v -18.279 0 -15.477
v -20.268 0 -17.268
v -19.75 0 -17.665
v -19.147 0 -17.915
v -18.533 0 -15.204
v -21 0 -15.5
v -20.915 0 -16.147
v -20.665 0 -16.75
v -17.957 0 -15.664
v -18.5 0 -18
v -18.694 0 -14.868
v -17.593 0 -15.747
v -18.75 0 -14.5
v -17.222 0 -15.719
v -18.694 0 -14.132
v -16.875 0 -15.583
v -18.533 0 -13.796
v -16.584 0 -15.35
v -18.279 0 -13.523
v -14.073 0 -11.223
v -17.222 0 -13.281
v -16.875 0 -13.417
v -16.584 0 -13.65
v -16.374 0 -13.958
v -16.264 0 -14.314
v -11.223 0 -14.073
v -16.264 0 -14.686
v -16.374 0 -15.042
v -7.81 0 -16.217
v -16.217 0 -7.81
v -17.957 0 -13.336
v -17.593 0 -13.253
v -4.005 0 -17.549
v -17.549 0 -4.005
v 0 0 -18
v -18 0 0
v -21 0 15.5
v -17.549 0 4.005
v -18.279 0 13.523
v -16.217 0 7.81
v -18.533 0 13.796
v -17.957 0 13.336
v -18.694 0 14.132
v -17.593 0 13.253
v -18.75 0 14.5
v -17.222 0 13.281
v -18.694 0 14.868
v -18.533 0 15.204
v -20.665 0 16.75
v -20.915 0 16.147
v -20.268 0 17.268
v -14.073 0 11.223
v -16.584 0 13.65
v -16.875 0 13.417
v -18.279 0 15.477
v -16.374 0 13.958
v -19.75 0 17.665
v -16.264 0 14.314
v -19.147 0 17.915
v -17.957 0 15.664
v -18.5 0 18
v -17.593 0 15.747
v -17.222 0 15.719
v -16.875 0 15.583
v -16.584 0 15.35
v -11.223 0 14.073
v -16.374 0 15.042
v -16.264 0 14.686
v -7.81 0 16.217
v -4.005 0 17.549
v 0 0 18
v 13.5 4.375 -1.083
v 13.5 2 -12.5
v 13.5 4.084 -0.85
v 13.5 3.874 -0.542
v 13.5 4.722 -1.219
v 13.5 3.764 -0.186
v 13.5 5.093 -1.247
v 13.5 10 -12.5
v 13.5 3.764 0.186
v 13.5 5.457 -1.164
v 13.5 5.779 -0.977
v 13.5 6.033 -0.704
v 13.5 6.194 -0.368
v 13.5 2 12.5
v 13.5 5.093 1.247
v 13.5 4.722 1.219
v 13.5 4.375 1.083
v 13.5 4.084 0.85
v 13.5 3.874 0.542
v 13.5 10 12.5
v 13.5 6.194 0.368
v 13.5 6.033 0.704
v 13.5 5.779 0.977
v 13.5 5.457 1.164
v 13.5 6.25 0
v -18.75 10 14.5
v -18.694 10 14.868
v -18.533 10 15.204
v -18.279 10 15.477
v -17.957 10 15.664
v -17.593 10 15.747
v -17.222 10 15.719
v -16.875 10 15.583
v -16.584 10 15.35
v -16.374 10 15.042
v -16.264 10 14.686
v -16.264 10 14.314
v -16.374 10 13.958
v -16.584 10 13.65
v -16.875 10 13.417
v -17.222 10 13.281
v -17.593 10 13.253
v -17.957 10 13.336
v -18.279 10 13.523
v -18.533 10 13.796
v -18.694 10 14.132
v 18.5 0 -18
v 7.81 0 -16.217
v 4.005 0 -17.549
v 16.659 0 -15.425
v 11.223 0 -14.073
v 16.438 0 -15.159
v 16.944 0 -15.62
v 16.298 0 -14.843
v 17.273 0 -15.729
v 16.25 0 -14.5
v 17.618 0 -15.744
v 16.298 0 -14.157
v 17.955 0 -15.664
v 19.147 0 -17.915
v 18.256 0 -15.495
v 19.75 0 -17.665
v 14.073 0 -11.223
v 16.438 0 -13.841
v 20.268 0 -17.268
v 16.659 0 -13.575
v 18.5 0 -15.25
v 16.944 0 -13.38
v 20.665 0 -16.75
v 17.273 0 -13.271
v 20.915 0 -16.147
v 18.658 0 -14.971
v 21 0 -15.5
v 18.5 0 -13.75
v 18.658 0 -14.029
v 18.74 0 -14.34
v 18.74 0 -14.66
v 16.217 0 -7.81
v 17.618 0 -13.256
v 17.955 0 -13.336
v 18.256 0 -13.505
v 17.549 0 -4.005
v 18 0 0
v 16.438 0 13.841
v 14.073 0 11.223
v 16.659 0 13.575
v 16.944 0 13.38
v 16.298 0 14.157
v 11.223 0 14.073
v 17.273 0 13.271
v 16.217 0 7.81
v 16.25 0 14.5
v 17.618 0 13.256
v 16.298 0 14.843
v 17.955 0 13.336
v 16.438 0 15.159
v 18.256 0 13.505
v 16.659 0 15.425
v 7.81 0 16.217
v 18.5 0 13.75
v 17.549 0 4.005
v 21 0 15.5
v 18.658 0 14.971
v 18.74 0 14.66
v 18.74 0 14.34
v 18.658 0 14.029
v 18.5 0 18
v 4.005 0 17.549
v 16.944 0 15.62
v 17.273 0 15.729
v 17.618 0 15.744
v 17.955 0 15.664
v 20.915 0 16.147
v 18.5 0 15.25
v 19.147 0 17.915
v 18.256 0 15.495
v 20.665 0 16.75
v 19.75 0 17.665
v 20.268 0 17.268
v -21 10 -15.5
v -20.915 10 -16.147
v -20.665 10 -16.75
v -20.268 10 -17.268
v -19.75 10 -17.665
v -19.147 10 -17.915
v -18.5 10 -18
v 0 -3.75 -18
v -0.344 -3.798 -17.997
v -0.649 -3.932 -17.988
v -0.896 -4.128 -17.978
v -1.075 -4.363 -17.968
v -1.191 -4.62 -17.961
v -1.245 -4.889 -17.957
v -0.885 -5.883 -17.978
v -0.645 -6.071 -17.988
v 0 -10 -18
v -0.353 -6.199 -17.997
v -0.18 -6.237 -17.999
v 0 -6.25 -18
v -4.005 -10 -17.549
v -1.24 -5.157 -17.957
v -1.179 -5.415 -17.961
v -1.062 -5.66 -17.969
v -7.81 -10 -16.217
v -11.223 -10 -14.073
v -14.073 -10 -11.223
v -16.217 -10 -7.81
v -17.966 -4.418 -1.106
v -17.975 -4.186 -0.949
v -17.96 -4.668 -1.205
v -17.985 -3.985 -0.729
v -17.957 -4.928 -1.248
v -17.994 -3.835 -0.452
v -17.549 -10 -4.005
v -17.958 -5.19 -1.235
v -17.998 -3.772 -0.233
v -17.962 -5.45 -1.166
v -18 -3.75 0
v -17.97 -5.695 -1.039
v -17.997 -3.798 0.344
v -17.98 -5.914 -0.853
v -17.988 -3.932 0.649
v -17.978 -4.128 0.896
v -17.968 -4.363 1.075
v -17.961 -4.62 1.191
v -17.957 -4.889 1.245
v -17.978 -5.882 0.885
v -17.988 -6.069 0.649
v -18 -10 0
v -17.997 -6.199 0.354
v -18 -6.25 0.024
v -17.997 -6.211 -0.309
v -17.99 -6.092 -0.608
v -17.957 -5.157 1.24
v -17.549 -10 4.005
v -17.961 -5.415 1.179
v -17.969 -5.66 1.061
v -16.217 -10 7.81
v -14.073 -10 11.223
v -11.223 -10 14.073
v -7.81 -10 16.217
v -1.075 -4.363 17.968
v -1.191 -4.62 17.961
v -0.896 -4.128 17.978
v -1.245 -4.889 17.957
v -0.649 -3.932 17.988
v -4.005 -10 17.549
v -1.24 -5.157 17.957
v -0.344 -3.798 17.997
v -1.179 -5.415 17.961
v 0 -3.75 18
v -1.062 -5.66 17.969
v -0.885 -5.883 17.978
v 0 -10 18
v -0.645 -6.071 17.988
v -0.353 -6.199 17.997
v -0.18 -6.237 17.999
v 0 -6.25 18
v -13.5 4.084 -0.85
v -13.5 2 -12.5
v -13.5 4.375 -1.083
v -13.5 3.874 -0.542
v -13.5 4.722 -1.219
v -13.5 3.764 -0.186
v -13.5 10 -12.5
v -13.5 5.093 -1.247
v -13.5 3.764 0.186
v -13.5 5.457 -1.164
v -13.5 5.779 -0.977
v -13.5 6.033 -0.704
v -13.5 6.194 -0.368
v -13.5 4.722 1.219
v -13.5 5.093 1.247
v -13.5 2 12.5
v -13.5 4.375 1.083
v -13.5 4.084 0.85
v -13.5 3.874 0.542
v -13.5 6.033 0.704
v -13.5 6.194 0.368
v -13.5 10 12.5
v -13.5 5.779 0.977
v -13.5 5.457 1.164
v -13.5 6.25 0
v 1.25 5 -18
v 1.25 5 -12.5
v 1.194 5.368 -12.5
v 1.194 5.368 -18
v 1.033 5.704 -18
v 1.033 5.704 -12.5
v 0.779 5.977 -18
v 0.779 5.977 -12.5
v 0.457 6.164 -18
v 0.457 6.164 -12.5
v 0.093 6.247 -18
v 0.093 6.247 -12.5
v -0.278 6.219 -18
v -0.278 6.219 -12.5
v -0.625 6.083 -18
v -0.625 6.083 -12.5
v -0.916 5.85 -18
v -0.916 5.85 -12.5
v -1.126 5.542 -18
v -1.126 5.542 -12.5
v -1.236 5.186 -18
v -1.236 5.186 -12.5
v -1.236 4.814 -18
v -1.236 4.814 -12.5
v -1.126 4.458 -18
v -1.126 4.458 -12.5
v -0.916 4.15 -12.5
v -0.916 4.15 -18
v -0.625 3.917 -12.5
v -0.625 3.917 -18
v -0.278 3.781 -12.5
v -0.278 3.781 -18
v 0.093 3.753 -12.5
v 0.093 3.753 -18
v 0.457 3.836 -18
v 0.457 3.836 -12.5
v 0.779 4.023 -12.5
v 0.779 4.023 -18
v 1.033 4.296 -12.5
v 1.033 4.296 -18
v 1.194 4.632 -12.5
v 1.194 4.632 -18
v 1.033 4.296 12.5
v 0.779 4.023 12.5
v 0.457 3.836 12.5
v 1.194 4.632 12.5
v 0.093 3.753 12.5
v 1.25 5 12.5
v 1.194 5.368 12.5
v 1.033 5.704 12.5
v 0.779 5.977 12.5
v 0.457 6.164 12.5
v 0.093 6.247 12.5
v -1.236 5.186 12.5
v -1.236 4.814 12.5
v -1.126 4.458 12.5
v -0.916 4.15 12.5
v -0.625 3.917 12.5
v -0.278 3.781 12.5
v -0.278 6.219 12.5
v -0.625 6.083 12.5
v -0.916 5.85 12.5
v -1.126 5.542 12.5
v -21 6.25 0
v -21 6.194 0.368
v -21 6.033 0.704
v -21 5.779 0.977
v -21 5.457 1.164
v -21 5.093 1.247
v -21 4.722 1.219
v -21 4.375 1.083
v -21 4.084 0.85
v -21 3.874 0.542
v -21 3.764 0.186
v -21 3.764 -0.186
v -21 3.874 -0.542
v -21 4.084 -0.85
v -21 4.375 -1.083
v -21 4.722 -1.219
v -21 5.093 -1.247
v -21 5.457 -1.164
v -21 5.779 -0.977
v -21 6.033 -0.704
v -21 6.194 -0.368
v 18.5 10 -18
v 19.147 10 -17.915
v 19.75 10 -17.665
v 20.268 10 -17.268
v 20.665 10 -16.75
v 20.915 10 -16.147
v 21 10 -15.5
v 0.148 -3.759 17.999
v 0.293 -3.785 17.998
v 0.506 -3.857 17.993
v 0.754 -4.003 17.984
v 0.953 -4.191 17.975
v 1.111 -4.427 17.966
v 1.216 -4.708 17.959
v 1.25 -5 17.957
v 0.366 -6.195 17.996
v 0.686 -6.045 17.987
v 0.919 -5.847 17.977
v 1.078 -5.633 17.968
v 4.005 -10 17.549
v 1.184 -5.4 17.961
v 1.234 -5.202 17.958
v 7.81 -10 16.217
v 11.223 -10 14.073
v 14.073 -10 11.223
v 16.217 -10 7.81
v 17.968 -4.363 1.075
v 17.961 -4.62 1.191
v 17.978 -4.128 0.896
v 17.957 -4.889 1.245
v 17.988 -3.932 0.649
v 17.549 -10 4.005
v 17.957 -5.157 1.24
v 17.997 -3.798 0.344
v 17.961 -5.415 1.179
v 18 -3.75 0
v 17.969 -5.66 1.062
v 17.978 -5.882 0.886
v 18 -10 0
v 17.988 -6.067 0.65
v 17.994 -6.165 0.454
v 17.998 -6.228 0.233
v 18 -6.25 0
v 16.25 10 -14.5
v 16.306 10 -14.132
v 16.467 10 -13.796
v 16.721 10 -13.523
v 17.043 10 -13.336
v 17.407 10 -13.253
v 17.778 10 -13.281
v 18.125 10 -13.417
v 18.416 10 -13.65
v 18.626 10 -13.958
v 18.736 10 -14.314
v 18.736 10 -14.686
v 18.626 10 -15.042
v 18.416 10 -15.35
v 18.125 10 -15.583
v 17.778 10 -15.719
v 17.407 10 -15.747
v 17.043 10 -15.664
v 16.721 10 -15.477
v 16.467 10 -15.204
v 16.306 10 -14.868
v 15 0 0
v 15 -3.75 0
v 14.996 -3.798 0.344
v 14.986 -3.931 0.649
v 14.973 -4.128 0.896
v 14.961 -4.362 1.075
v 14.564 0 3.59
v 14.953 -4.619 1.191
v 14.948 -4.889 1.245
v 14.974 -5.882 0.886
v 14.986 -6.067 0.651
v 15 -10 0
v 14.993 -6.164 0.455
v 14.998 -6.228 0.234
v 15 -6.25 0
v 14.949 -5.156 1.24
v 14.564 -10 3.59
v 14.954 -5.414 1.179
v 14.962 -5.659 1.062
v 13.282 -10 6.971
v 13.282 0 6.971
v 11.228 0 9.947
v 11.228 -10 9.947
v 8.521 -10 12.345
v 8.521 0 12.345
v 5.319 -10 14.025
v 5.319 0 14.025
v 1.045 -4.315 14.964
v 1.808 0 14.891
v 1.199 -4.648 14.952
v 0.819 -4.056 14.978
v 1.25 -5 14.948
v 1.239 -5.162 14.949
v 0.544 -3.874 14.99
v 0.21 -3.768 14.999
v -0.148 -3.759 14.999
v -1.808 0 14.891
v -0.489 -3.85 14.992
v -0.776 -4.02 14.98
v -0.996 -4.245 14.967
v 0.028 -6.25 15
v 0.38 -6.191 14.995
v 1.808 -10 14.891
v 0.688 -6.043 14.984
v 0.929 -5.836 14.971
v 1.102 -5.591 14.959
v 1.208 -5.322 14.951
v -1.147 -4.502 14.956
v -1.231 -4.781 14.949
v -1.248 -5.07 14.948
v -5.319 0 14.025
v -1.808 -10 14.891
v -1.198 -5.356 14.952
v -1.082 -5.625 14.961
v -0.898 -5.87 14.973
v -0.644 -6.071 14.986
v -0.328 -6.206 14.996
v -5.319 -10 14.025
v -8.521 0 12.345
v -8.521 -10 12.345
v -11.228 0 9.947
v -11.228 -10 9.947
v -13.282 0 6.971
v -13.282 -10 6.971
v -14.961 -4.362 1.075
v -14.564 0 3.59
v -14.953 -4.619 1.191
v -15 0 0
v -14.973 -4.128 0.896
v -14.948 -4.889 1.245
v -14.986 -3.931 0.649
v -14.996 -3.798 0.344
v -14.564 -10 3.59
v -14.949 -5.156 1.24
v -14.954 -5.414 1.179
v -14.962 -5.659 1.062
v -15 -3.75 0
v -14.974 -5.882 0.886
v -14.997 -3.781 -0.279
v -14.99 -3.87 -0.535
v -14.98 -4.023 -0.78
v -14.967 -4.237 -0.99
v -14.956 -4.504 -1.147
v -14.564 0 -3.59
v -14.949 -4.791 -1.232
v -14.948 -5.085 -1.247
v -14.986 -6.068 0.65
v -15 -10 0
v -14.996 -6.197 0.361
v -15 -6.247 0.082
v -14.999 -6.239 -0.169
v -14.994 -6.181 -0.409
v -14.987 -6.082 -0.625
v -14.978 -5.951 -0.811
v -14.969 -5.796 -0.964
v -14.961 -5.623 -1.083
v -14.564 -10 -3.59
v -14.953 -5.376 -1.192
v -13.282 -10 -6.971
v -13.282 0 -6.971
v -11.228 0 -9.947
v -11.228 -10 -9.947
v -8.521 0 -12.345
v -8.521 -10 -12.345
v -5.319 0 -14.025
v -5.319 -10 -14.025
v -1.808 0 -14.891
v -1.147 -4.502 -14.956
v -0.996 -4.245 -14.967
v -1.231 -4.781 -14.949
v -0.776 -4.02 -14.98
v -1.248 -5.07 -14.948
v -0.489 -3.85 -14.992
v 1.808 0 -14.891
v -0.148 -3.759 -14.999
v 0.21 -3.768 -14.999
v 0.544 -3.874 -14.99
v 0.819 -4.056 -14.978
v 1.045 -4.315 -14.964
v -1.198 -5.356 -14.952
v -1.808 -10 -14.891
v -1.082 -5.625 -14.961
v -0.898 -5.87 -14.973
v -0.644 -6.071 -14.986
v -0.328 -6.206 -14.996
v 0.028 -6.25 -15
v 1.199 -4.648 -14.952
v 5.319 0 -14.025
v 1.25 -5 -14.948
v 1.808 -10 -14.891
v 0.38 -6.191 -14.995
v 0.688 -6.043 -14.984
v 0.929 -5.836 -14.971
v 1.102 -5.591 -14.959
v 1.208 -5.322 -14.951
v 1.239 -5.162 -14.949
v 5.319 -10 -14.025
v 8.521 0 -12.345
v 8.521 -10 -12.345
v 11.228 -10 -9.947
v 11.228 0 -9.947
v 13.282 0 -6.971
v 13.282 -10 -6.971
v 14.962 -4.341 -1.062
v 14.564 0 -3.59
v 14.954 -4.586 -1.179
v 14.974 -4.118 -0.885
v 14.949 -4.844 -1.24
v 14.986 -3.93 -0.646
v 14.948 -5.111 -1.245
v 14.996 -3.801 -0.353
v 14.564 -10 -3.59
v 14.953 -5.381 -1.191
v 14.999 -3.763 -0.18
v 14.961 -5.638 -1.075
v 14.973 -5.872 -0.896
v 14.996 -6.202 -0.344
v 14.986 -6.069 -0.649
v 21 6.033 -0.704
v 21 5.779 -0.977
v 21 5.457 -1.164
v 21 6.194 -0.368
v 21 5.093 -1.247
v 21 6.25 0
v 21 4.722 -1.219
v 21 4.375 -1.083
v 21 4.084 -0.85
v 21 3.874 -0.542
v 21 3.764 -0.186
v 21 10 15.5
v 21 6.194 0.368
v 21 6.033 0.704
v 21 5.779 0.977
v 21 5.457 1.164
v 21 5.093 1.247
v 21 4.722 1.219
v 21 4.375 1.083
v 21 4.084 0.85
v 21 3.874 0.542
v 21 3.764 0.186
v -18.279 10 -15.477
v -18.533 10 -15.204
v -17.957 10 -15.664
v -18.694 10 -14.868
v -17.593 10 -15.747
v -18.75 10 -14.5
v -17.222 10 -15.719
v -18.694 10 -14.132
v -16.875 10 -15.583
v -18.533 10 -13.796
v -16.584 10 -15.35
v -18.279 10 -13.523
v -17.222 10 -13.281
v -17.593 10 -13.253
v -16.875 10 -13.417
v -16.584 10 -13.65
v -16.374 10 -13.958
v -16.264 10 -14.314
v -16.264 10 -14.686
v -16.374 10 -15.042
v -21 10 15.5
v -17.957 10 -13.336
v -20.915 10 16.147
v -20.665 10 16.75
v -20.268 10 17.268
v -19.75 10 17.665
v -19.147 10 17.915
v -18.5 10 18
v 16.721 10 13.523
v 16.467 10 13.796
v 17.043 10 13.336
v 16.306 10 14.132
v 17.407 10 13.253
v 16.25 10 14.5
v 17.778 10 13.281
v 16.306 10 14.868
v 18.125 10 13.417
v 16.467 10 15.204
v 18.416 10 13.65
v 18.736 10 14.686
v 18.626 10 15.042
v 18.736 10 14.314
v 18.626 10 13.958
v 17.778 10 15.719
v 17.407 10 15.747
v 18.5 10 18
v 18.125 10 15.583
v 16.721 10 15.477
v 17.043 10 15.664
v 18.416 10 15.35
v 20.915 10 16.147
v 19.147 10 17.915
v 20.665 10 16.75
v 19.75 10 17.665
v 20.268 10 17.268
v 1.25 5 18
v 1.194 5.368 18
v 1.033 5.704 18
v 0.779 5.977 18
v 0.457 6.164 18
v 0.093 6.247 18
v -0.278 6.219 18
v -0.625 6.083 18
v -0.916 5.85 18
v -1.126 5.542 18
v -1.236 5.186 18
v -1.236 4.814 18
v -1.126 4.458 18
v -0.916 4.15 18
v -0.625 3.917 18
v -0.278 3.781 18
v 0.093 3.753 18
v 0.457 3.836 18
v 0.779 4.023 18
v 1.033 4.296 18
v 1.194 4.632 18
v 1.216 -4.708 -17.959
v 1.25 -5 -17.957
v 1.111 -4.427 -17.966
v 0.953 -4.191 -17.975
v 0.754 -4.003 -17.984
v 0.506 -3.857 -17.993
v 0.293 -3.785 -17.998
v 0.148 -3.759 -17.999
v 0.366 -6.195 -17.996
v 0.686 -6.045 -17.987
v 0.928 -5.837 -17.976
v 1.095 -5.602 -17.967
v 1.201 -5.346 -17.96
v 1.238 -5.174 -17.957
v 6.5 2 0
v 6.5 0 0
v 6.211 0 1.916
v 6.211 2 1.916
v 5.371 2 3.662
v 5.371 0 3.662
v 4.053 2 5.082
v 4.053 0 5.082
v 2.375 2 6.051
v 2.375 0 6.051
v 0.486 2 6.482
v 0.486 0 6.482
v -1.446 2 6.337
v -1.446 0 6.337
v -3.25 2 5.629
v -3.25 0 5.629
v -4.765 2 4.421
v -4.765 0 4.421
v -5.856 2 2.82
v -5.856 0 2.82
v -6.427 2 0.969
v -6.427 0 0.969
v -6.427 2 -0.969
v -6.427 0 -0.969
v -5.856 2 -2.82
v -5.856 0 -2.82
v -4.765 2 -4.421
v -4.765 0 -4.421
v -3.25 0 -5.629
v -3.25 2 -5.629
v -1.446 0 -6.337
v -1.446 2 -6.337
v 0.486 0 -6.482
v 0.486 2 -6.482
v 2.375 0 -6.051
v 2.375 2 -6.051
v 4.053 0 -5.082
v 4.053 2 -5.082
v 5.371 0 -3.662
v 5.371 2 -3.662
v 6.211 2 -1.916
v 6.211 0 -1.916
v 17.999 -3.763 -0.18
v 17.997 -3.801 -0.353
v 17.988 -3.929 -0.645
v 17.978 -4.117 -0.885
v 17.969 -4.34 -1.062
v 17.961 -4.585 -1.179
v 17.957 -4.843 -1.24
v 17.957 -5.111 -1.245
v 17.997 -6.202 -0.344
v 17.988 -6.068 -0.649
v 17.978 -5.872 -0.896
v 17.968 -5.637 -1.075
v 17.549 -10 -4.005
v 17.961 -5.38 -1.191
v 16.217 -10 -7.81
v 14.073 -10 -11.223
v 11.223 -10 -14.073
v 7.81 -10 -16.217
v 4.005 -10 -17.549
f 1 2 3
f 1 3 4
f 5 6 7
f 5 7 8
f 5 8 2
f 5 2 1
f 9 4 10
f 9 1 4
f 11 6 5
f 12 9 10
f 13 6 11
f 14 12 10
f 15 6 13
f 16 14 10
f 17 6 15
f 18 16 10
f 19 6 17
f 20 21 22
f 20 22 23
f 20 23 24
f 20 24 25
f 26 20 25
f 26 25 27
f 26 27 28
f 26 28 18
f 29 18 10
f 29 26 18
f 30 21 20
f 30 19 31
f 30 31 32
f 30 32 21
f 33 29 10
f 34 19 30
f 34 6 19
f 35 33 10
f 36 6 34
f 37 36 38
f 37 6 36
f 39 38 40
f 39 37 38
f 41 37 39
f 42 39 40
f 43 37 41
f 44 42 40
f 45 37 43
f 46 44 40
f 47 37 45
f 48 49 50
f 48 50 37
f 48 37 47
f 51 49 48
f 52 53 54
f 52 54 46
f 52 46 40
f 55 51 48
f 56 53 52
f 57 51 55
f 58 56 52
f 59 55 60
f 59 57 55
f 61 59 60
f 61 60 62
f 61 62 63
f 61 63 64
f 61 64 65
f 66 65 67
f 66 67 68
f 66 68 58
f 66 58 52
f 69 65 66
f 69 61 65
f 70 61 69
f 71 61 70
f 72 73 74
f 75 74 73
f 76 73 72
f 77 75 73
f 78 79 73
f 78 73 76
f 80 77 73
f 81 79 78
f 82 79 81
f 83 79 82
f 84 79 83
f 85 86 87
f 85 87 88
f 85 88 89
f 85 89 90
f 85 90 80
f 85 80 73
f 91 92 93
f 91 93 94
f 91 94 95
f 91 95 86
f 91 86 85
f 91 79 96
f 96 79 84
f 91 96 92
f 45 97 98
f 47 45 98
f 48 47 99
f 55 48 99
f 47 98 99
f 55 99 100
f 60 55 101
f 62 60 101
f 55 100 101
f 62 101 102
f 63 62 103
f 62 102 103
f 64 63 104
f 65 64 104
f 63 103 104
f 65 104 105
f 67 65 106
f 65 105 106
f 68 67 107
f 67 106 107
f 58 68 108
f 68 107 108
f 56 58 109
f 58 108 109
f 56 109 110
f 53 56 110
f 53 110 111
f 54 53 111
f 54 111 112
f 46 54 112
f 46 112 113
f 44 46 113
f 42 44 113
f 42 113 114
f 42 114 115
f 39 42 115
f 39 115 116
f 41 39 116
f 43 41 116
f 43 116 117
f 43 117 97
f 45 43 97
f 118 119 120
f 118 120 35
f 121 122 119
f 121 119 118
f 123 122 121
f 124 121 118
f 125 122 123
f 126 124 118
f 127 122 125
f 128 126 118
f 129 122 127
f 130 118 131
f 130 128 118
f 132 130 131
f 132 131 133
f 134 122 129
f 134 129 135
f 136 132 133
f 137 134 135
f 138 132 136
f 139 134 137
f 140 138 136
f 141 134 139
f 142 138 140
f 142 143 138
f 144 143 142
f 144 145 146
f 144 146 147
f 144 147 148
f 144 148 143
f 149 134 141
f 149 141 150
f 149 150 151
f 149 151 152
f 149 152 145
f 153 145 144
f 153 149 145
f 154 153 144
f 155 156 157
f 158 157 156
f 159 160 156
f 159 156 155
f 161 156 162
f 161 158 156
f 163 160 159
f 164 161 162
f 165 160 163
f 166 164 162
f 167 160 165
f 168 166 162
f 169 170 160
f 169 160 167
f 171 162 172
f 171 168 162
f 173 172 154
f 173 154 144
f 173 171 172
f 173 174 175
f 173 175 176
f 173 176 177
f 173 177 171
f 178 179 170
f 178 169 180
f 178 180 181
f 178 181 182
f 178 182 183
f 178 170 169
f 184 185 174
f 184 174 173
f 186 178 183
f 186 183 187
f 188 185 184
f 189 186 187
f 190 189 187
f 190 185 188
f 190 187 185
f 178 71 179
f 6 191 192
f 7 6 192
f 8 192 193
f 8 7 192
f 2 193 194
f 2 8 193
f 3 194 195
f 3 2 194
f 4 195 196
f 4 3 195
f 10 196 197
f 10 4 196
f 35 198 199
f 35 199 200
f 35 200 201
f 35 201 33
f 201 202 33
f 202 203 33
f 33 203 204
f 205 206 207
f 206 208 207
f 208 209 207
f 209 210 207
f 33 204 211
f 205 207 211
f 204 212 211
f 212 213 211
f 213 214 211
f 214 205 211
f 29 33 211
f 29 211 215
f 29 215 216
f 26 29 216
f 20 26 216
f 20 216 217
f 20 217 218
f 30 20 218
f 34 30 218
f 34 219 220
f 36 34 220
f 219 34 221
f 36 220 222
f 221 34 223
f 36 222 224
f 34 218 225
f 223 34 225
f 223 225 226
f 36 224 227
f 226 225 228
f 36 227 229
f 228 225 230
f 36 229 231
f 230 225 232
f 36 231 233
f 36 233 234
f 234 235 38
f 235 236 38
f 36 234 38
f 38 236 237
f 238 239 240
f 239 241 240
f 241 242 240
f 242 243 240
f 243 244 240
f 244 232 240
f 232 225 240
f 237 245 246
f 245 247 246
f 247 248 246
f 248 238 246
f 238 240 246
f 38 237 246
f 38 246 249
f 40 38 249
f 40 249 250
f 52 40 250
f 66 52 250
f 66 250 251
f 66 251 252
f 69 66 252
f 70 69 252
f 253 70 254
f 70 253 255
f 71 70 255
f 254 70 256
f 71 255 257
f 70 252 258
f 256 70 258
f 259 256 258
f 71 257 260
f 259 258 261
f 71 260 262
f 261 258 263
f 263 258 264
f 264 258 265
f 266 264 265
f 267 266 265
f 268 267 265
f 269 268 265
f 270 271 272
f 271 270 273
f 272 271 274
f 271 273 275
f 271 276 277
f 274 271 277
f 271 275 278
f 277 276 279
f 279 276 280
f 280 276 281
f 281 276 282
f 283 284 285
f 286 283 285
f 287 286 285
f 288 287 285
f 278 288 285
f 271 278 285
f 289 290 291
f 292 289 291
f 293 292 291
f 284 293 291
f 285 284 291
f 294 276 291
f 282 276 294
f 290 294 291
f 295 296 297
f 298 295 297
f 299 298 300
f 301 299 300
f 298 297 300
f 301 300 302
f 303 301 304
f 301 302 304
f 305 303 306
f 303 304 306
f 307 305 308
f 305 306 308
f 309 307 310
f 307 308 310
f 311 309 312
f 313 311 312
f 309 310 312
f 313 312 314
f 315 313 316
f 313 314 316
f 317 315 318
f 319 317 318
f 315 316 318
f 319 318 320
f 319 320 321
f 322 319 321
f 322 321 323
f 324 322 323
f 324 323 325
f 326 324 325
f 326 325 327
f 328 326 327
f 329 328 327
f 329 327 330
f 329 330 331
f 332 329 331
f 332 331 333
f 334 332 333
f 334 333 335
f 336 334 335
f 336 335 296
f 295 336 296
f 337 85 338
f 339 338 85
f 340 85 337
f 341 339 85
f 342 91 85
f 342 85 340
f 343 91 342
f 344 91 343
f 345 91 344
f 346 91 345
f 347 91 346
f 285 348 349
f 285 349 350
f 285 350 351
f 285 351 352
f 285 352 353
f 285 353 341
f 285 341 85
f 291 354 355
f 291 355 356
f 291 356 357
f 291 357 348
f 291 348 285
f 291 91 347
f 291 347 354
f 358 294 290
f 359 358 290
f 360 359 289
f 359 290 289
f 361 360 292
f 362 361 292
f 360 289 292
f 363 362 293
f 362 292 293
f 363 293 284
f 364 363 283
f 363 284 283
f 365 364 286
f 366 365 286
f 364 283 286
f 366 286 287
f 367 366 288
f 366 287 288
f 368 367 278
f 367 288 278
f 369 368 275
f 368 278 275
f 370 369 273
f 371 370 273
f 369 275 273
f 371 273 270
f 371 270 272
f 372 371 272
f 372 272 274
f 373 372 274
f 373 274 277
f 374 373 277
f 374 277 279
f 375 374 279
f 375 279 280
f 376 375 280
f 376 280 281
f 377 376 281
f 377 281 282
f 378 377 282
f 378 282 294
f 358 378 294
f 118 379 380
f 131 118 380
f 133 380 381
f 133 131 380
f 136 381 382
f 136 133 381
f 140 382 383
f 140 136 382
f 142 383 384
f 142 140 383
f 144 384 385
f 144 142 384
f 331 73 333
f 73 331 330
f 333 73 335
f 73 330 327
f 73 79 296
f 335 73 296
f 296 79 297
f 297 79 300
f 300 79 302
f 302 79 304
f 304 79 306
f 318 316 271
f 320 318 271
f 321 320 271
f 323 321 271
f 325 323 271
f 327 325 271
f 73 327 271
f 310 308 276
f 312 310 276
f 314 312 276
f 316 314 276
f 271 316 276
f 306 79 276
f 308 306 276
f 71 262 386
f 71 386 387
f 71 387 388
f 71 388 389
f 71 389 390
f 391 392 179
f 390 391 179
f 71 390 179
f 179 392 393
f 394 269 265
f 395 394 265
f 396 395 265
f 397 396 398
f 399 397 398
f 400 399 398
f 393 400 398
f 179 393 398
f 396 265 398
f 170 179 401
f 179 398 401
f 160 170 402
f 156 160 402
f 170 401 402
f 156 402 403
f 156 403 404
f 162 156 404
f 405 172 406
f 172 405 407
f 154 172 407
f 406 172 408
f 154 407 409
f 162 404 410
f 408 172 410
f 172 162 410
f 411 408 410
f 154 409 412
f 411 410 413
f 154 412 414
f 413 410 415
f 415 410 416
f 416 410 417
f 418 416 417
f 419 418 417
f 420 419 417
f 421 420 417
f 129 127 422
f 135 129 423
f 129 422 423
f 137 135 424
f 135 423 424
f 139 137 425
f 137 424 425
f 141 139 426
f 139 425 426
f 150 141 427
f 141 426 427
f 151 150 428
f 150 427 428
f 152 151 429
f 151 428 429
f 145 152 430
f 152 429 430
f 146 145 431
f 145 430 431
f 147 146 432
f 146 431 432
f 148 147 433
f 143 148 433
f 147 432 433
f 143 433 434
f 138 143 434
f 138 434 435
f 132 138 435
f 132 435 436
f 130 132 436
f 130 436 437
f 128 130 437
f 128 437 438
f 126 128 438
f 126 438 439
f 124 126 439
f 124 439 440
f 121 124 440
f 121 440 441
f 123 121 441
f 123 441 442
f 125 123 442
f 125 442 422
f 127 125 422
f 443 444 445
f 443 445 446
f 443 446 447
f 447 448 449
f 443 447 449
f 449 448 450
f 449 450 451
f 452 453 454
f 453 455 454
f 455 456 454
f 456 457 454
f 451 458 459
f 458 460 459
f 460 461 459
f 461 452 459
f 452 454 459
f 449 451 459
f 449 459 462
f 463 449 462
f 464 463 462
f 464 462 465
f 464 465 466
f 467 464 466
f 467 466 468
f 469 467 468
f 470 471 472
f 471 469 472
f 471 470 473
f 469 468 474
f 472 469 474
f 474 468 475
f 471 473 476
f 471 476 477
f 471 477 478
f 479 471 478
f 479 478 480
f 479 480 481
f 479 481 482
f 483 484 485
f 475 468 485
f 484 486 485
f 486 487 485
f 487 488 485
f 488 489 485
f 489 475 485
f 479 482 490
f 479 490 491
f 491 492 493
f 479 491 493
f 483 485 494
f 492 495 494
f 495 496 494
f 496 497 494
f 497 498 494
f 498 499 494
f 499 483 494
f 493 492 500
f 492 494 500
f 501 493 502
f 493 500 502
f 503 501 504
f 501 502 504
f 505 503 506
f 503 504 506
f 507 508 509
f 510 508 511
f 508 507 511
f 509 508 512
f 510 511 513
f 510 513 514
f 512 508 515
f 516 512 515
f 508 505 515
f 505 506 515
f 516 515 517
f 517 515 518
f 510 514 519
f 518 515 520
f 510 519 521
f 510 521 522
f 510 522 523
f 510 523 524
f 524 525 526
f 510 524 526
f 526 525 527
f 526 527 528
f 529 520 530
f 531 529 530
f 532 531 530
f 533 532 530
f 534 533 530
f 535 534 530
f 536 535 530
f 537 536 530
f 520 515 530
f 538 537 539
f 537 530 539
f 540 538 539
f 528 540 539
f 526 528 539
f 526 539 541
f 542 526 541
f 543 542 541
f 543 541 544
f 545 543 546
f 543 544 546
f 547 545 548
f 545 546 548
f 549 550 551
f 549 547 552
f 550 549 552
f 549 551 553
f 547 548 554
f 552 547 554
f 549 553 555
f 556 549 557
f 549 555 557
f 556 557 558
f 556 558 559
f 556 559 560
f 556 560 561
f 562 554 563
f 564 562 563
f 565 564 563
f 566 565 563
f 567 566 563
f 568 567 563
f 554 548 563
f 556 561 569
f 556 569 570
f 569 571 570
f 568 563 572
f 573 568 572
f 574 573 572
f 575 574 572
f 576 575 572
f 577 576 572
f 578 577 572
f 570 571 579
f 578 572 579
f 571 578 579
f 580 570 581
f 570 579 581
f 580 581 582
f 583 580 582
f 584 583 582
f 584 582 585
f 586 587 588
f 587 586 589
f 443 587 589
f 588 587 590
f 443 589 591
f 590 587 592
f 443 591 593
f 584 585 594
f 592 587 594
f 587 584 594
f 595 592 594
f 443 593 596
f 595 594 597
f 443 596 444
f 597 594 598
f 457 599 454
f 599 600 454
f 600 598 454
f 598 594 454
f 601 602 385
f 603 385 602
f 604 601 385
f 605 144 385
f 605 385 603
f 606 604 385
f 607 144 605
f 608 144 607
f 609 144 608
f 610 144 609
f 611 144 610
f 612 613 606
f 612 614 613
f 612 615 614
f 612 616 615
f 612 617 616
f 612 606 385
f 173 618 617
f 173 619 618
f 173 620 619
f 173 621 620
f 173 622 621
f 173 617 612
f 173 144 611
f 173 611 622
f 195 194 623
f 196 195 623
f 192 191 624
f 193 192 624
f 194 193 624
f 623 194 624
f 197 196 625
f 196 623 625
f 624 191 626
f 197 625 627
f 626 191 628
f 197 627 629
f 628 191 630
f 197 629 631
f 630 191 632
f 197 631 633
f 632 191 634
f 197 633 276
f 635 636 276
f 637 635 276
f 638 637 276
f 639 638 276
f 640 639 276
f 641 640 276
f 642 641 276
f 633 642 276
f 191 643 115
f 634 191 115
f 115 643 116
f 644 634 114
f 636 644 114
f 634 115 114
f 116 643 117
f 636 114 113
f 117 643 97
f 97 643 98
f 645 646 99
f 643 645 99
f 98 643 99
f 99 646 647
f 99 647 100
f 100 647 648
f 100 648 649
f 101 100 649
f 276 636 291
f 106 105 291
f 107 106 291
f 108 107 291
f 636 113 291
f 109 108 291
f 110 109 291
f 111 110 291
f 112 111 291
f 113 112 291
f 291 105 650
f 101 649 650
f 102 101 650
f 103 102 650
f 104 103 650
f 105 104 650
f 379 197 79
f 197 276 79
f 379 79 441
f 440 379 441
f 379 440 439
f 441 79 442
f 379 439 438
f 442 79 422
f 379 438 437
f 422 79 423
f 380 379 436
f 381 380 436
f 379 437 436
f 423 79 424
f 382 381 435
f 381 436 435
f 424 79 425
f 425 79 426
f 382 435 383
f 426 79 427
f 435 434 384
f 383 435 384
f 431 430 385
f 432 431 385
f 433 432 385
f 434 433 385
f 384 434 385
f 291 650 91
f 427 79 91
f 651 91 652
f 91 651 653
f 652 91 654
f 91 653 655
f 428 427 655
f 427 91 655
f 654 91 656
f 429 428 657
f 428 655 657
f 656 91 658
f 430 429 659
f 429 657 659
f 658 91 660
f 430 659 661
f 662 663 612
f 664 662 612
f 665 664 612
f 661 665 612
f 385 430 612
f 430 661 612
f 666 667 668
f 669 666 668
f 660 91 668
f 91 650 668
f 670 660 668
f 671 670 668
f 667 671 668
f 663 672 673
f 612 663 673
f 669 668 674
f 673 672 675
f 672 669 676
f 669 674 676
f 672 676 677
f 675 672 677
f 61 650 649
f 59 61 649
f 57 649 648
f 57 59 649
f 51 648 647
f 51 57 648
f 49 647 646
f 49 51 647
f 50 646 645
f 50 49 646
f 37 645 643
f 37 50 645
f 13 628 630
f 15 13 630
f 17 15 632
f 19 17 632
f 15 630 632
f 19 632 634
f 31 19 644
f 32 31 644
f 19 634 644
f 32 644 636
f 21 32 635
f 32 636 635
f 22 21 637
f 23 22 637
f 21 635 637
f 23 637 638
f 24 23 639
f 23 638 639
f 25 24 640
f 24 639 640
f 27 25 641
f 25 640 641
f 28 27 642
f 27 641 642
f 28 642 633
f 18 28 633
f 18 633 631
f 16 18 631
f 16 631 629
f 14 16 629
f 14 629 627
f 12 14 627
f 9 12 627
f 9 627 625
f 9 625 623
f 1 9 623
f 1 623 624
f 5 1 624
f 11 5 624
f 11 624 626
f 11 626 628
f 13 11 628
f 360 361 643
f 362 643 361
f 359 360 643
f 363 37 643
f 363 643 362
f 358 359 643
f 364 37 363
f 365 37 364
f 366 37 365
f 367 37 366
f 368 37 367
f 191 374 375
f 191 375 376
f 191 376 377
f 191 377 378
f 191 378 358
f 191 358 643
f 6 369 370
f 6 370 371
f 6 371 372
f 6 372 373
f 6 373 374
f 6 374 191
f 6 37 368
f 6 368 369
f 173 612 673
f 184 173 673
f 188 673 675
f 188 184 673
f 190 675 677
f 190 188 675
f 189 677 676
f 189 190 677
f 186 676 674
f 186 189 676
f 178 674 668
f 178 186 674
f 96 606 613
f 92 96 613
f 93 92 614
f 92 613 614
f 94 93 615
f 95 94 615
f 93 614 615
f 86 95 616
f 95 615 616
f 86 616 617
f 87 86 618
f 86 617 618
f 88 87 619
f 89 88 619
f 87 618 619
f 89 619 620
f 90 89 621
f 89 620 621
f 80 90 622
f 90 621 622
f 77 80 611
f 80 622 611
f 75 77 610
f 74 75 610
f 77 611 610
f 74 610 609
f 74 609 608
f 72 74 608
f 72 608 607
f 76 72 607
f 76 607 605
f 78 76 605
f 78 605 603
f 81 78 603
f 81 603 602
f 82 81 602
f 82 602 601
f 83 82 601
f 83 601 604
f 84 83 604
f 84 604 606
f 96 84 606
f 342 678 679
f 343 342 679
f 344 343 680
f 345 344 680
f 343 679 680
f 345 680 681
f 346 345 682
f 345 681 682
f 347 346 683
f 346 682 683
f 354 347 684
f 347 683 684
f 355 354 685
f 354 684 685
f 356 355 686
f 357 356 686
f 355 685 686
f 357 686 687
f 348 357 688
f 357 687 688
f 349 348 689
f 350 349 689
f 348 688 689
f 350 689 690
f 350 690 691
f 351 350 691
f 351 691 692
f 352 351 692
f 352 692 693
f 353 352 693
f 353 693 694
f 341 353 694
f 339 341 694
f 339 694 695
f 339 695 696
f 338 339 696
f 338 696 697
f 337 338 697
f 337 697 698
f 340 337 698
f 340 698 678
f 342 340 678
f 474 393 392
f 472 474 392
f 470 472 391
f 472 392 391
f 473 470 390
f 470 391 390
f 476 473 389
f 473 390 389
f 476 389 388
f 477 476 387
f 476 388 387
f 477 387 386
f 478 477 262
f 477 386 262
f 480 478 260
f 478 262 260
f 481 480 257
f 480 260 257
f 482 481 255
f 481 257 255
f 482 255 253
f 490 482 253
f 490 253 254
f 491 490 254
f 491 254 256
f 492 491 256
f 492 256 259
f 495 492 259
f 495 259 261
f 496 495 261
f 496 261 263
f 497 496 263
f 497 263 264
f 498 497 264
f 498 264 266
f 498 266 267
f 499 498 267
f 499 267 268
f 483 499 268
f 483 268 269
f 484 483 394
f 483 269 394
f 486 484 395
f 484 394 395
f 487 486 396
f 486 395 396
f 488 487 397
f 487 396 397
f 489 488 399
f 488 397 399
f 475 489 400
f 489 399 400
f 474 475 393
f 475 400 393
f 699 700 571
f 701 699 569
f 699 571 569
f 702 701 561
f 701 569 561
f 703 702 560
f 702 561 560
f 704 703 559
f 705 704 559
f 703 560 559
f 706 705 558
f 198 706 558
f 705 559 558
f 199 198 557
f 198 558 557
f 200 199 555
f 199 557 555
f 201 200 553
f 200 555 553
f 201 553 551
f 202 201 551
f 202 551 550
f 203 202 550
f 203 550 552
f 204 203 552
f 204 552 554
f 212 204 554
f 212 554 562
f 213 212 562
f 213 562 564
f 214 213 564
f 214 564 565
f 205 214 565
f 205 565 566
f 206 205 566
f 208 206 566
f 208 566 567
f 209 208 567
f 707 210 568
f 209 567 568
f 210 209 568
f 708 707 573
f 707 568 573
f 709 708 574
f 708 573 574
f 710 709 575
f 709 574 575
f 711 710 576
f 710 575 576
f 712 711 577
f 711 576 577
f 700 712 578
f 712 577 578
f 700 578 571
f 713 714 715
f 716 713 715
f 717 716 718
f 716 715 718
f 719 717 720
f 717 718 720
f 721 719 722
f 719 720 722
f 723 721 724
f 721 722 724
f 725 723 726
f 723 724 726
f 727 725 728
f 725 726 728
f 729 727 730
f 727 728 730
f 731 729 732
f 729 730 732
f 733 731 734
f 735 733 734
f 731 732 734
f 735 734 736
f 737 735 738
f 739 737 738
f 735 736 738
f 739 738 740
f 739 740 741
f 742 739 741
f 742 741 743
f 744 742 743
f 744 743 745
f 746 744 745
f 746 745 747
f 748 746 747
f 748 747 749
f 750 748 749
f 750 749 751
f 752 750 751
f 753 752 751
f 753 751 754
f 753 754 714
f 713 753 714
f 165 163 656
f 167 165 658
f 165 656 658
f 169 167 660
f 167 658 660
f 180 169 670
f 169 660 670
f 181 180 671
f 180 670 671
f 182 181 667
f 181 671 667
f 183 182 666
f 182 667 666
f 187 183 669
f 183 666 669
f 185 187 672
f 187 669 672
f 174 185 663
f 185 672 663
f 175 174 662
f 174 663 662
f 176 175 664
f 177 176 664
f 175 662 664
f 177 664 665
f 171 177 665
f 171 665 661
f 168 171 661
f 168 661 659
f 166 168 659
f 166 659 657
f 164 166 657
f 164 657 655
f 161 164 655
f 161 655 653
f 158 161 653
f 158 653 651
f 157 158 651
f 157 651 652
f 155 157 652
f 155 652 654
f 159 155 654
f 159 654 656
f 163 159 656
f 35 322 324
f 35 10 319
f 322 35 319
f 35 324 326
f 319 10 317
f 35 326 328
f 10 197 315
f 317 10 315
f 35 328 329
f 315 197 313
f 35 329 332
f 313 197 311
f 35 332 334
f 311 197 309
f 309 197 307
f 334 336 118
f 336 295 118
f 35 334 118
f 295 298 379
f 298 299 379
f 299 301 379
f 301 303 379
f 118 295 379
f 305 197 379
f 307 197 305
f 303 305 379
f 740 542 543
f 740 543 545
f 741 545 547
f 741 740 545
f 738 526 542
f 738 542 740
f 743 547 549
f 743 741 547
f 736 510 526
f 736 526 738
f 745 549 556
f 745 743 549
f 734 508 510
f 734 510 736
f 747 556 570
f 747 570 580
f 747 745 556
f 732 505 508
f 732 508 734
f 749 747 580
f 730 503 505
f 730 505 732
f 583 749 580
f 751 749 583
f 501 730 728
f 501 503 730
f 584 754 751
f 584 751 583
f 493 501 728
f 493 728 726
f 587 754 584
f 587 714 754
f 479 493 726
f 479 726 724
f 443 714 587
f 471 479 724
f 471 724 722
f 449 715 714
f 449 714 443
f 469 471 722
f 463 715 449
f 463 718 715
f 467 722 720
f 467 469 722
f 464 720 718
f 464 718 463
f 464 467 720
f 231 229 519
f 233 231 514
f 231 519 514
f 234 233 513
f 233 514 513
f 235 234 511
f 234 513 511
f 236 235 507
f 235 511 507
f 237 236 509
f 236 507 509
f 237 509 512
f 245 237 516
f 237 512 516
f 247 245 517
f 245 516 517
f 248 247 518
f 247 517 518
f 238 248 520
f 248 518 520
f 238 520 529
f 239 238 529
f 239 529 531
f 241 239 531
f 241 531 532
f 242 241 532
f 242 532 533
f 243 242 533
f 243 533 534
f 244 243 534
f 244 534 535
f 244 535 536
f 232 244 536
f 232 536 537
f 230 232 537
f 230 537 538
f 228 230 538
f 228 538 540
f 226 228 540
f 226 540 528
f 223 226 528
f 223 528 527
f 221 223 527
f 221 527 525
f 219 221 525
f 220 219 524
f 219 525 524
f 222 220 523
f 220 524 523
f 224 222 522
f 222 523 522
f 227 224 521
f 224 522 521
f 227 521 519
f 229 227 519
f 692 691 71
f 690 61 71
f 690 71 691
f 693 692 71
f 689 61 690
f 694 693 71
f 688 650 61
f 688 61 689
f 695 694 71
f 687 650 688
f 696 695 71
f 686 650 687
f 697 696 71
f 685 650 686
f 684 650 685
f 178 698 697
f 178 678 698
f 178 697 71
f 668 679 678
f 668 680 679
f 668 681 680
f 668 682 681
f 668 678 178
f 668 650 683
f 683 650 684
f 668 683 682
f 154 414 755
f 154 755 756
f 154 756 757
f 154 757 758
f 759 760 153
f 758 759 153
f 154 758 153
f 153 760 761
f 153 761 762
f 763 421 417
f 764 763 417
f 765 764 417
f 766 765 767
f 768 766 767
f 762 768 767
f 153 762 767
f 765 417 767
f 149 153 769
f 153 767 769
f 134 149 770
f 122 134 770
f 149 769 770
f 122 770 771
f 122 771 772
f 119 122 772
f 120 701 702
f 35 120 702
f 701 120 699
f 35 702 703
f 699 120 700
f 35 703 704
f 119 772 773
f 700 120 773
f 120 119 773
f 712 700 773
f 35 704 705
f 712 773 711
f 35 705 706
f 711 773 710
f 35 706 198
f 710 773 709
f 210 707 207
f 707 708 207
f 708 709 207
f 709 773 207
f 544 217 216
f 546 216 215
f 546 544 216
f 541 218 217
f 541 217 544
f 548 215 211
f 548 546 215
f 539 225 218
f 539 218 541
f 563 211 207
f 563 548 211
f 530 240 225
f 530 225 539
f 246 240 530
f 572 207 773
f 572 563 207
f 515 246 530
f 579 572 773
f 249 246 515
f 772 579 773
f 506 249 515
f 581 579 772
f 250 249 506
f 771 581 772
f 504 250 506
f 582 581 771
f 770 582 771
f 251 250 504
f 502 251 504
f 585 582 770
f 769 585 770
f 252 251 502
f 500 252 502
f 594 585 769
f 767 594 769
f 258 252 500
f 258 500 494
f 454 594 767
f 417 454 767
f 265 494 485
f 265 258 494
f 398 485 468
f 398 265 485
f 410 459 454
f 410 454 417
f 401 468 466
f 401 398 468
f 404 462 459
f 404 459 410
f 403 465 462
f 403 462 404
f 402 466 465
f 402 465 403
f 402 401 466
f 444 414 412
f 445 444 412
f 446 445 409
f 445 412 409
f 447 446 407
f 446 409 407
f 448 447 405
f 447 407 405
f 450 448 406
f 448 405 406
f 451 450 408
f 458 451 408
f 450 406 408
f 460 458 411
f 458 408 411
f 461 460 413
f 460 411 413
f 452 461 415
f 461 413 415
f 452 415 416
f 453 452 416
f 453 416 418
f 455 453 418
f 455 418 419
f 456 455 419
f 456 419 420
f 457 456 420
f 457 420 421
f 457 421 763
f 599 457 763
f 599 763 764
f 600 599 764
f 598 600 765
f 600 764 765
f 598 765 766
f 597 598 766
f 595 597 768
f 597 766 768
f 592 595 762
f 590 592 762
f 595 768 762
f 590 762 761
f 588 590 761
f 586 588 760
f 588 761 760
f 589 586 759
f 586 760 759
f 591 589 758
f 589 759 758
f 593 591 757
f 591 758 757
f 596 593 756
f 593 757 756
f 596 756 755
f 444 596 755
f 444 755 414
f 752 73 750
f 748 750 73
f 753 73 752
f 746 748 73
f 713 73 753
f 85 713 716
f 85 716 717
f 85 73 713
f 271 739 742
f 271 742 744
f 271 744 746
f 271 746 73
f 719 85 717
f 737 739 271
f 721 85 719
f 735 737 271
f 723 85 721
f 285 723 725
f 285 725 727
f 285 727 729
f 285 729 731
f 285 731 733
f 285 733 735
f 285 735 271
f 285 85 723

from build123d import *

# Parameters (mm, degrees)
F1_DEPTH  = 10
F2_W      = 37
F2_H      = 36
F3_DEPTH  = 10
F4_R      = 1.25
F5_DEPTH  = 25
F6_W      = 27
F6_H      = 25
F7_DEPTH  = 8
F8_R      = 1.25
F9_DEPTH  = 36.001
F10_R     = 1.25
F11_DEPTH = 42.001
F13_R     = 15
F14_DEPTH = 10
F15_DEPTH = 10
F16_R     = 6.5
F17_DEPTH = 10.001


with BuildPart() as f1:
    # F0 (on Front) → F1 (new body)
    with BuildSketch(Plane.XZ):
        with BuildLine():
            Line((-18.5, -18), (18.5, -18))
            ThreePointArc((18.5, -18), (20.267767, -17.267767), (21, -15.5))
            Line((21, -15.5), (21, 15.5))
            ThreePointArc((21, 15.5), (20.267767, 17.267767), (18.5, 18))
            Line((18.5, 18), (-18.5, 18))
            ThreePointArc((-18.5, 18), (-20.267767, 17.267767), (-21, 15.5))
            Line((-21, 15.5), (-21, -15.5))
            ThreePointArc((-21, -15.5), (-20.267767, -17.267767), (-18.5, -18))
        make_face()
    extrude(amount=-F1_DEPTH)

    # F2 (on face) → F3 (join)
    with BuildSketch(Plane.XZ):
        Rectangle(F2_W, F2_H)
    extrude(amount=F3_DEPTH)

    # F4 (on face) → F5 (cut)
    with BuildSketch(Plane(origin=(0, 10, 0), x_dir=(-1, 0, 0), z_dir=(0, 1, 0))):
        with Locations((-17.5, 14.5)):
            Circle(F4_R)
        with Locations((17.5, 14.5)):
            Circle(F4_R)
        with Locations((-17.5, -14.5)):
            Circle(F4_R)
        with Locations((17.5, -14.5)):
            Circle(F4_R)
    extrude(amount=-F5_DEPTH, mode=Mode.SUBTRACT)

    # F6 (on face) → F7 (cut)
    with BuildSketch(Plane(origin=(0, 10, 0), x_dir=(-1, 0, 0), z_dir=(0, 1, 0))):
        Rectangle(F6_W, F6_H)
    extrude(amount=-F7_DEPTH, mode=Mode.SUBTRACT)

    # F8 (on face) → F9 (cut, through all)
    with BuildSketch(Plane.XY.offset(18)):
        with Locations((0, 5)):
            Circle(F8_R)
        with Locations((0, -5)):
            Circle(F8_R)
    extrude(amount=-F9_DEPTH, mode=Mode.SUBTRACT)

    # F10 (on face) → F11 (cut, through all)
    with BuildSketch(Plane.YZ.offset(21)):
        with Locations((5, 0)):
            Circle(F10_R)
        with Locations((-5, 0)):
            Circle(F10_R)
    extrude(amount=-F11_DEPTH, mode=Mode.SUBTRACT)

    # F13 (on face) → F14 (cut)
    with BuildSketch(Plane.XZ.offset(10)):
        Circle(F13_R)
    extrude(amount=-F14_DEPTH, mode=Mode.SUBTRACT)

    # F12 (on face) → F15 (cut)
    with BuildSketch(Plane.XZ.offset(10)):
        with BuildLine():
            ThreePointArc((0, -18), (-18, 0), (0, 18))
            Line((0, 18), (-18.5, 18))
            Line((-18.5, 18), (-18.5, 15.25))
            ThreePointArc((-18.5, 15.25), (-16.25, 14.5), (-18.5, 13.75))
            Line((-18.5, 13.75), (-18.5, -13.75))
            ThreePointArc((-18.5, -13.75), (-16.25, -14.5), (-18.5, -15.25))
            Line((-18.5, -15.25), (-18.5, -18))
            Line((-18.5, -18), (0, -18))
        make_face()
        with BuildLine():
            ThreePointArc((0, 18), (12.727922, 12.727922), (18, 0))
            ThreePointArc((18, 0), (12.727922, -12.727922), (0, -18))
            Line((0, -18), (18.5, -18))
            Line((18.5, -18), (18.5, -15.25))
            ThreePointArc((18.5, -15.25), (17.104715, -15.685854), (16.25, -14.5))
            ThreePointArc((16.25, -14.5), (17.104715, -13.314146), (18.5, -13.75))
            Line((18.5, -13.75), (18.5, 13.75))
            ThreePointArc((18.5, 13.75), (17.104715, 13.314146), (16.25, 14.5))
            ThreePointArc((16.25, 14.5), (17.104715, 15.685854), (18.5, 15.25))
            Line((18.5, 15.25), (18.5, 18))
            Line((18.5, 18), (0, 18))
        make_face()
    extrude(amount=-F15_DEPTH, mode=Mode.SUBTRACT)

    # F16 (on face) → F17 (cut, through all)
    with BuildSketch(Plane.XZ):
        Circle(F16_R)
    extrude(amount=-F17_DEPTH, mode=Mode.SUBTRACT)


solid = f1.part
